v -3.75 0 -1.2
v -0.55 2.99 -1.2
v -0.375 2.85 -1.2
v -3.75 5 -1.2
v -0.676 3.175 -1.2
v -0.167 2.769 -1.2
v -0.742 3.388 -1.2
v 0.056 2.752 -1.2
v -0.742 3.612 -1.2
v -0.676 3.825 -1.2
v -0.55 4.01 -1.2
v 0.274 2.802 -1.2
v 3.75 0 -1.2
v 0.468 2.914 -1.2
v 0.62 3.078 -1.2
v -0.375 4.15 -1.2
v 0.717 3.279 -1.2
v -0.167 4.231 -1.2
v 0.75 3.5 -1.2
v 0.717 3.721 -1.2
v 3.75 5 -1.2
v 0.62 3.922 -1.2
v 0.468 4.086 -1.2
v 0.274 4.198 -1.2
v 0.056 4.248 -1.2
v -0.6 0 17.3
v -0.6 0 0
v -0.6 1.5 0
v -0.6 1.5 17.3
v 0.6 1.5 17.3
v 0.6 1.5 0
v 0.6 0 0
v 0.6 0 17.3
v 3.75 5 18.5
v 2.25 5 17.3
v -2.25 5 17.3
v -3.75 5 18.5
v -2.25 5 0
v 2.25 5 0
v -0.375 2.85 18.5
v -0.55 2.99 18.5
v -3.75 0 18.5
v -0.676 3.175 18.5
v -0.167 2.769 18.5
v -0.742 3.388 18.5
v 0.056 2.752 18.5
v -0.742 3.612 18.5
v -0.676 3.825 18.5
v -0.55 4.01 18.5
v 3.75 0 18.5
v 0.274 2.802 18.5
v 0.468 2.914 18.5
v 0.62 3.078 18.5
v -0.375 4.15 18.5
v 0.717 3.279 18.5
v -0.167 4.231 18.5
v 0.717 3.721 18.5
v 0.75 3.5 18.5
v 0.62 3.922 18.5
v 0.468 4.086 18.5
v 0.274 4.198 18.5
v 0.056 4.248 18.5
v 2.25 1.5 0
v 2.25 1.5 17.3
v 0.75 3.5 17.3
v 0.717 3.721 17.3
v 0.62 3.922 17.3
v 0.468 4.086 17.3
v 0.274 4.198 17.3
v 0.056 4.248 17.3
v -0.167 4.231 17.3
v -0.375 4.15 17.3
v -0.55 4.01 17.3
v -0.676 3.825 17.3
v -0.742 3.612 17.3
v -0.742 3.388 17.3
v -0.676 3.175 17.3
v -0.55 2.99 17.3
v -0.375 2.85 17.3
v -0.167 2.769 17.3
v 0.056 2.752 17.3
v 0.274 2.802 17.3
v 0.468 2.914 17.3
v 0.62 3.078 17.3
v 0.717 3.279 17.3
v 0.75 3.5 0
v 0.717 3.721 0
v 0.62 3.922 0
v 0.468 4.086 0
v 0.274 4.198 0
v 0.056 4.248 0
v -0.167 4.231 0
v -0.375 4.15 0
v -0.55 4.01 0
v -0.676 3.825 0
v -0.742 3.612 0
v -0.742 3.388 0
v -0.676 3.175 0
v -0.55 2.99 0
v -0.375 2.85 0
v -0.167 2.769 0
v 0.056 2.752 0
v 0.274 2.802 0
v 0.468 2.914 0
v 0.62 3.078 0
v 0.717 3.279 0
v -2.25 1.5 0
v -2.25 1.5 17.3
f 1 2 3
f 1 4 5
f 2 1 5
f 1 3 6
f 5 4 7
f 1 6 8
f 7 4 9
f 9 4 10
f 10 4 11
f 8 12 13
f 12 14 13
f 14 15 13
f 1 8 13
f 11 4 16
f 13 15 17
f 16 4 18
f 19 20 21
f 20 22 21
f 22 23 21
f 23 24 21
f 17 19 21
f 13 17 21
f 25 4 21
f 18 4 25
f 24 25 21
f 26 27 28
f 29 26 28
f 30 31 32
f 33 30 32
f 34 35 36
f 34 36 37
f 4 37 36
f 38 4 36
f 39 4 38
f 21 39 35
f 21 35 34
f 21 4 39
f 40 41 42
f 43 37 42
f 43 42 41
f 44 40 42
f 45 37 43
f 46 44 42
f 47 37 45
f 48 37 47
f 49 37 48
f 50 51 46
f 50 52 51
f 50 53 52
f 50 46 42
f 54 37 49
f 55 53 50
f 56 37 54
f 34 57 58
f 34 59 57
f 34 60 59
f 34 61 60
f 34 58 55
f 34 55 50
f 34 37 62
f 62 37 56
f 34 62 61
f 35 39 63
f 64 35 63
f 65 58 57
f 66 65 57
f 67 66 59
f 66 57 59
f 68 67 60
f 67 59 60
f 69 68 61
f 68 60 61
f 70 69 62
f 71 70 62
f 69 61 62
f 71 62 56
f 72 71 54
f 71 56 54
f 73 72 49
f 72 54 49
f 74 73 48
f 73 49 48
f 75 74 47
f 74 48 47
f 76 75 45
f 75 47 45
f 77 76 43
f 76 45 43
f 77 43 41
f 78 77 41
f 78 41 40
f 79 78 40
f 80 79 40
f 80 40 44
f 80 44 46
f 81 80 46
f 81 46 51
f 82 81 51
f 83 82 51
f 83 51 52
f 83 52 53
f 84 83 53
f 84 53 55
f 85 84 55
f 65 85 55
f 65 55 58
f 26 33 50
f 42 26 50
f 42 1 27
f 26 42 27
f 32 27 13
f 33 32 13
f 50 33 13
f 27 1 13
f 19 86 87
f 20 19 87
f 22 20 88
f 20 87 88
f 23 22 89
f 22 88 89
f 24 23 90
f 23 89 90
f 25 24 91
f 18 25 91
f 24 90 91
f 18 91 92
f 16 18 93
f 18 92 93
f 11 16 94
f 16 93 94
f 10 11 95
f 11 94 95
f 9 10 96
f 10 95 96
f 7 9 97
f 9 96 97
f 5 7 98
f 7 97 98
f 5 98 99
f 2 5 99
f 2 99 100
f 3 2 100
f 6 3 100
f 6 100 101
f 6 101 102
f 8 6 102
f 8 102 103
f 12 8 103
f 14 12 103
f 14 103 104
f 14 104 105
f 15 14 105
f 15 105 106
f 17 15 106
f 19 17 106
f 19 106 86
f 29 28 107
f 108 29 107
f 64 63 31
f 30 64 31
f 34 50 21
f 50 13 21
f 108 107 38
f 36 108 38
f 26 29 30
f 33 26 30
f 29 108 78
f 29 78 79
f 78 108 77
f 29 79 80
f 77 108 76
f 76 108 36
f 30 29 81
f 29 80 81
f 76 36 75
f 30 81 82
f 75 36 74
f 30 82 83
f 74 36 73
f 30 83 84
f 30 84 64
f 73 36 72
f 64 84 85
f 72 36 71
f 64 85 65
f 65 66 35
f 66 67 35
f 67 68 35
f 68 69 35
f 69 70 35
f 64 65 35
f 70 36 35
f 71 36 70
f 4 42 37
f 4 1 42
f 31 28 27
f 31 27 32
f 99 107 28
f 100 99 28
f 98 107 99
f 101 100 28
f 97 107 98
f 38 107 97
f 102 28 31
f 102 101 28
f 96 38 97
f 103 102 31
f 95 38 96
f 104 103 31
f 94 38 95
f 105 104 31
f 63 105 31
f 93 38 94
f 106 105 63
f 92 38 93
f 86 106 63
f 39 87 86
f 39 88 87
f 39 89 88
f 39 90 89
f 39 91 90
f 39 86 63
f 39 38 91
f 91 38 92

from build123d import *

# Parameters (mm, degrees)
BODY_DEPTH        = 17.3
BODY_2_DEPTH      = 17.3
SKETCH2_W         = 7.5
SKETCH2_H         = 5
END_DEPTH         = 1.2
END1_START        = 17.3
SKETCH2_4_W       = 7.5
SKETCH2_4_H       = 5
END1_DEPTH        = 1.2
SKETCH3_R         = 0.75
TENDON_HOLE_DEPTH = 19.7


with BuildPart() as part:
    # Sketch1 → body (new body)
    with BuildSketch(Plane.XY):
        Polygon((3.75, 0), (3.75, 5), (2.25, 5), (2.25, 1.5), (0.6, 1.5), (0.6, 0), align=None)
    extrude(amount=BODY_DEPTH)



with BuildPart() as body_2_2:
    # Sketch1 → body 2 (new body)
    with BuildSketch(Plane.XY):
        Polygon((-2.25, 1.5), (-2.25, 5), (-3.75, 5), (-3.75, 0), (-0.6, 0), (-0.6, 1.5), align=None)
    extrude(amount=BODY_2_DEPTH)


with BuildPart() as part_1:
    add(part.part)

    add(body_2_2.part)  # end merges body 2 2
    # Sketch2 → end (add)
    with BuildSketch(Plane.XY):
        with Locations((0, 2.5)):
            Rectangle(SKETCH2_W, SKETCH2_H)
    extrude(amount=-END_DEPTH)

    # Sketch2<4> → end1 (add)
    with BuildSketch(Plane.XY.offset(END1_START)):
        with Locations((0, 2.5)):
            Rectangle(SKETCH2_4_W, SKETCH2_4_H)
    extrude(amount=END1_DEPTH)

    # Sketch3 → tendon hole (cut)
    with BuildSketch(Plane.XY.offset(18.5)):
        with Locations((0, 3.5)):
            Circle(SKETCH3_R)
    extrude(amount=-TENDON_HOLE_DEPTH, mode=Mode.SUBTRACT)


solid = part_1.part
